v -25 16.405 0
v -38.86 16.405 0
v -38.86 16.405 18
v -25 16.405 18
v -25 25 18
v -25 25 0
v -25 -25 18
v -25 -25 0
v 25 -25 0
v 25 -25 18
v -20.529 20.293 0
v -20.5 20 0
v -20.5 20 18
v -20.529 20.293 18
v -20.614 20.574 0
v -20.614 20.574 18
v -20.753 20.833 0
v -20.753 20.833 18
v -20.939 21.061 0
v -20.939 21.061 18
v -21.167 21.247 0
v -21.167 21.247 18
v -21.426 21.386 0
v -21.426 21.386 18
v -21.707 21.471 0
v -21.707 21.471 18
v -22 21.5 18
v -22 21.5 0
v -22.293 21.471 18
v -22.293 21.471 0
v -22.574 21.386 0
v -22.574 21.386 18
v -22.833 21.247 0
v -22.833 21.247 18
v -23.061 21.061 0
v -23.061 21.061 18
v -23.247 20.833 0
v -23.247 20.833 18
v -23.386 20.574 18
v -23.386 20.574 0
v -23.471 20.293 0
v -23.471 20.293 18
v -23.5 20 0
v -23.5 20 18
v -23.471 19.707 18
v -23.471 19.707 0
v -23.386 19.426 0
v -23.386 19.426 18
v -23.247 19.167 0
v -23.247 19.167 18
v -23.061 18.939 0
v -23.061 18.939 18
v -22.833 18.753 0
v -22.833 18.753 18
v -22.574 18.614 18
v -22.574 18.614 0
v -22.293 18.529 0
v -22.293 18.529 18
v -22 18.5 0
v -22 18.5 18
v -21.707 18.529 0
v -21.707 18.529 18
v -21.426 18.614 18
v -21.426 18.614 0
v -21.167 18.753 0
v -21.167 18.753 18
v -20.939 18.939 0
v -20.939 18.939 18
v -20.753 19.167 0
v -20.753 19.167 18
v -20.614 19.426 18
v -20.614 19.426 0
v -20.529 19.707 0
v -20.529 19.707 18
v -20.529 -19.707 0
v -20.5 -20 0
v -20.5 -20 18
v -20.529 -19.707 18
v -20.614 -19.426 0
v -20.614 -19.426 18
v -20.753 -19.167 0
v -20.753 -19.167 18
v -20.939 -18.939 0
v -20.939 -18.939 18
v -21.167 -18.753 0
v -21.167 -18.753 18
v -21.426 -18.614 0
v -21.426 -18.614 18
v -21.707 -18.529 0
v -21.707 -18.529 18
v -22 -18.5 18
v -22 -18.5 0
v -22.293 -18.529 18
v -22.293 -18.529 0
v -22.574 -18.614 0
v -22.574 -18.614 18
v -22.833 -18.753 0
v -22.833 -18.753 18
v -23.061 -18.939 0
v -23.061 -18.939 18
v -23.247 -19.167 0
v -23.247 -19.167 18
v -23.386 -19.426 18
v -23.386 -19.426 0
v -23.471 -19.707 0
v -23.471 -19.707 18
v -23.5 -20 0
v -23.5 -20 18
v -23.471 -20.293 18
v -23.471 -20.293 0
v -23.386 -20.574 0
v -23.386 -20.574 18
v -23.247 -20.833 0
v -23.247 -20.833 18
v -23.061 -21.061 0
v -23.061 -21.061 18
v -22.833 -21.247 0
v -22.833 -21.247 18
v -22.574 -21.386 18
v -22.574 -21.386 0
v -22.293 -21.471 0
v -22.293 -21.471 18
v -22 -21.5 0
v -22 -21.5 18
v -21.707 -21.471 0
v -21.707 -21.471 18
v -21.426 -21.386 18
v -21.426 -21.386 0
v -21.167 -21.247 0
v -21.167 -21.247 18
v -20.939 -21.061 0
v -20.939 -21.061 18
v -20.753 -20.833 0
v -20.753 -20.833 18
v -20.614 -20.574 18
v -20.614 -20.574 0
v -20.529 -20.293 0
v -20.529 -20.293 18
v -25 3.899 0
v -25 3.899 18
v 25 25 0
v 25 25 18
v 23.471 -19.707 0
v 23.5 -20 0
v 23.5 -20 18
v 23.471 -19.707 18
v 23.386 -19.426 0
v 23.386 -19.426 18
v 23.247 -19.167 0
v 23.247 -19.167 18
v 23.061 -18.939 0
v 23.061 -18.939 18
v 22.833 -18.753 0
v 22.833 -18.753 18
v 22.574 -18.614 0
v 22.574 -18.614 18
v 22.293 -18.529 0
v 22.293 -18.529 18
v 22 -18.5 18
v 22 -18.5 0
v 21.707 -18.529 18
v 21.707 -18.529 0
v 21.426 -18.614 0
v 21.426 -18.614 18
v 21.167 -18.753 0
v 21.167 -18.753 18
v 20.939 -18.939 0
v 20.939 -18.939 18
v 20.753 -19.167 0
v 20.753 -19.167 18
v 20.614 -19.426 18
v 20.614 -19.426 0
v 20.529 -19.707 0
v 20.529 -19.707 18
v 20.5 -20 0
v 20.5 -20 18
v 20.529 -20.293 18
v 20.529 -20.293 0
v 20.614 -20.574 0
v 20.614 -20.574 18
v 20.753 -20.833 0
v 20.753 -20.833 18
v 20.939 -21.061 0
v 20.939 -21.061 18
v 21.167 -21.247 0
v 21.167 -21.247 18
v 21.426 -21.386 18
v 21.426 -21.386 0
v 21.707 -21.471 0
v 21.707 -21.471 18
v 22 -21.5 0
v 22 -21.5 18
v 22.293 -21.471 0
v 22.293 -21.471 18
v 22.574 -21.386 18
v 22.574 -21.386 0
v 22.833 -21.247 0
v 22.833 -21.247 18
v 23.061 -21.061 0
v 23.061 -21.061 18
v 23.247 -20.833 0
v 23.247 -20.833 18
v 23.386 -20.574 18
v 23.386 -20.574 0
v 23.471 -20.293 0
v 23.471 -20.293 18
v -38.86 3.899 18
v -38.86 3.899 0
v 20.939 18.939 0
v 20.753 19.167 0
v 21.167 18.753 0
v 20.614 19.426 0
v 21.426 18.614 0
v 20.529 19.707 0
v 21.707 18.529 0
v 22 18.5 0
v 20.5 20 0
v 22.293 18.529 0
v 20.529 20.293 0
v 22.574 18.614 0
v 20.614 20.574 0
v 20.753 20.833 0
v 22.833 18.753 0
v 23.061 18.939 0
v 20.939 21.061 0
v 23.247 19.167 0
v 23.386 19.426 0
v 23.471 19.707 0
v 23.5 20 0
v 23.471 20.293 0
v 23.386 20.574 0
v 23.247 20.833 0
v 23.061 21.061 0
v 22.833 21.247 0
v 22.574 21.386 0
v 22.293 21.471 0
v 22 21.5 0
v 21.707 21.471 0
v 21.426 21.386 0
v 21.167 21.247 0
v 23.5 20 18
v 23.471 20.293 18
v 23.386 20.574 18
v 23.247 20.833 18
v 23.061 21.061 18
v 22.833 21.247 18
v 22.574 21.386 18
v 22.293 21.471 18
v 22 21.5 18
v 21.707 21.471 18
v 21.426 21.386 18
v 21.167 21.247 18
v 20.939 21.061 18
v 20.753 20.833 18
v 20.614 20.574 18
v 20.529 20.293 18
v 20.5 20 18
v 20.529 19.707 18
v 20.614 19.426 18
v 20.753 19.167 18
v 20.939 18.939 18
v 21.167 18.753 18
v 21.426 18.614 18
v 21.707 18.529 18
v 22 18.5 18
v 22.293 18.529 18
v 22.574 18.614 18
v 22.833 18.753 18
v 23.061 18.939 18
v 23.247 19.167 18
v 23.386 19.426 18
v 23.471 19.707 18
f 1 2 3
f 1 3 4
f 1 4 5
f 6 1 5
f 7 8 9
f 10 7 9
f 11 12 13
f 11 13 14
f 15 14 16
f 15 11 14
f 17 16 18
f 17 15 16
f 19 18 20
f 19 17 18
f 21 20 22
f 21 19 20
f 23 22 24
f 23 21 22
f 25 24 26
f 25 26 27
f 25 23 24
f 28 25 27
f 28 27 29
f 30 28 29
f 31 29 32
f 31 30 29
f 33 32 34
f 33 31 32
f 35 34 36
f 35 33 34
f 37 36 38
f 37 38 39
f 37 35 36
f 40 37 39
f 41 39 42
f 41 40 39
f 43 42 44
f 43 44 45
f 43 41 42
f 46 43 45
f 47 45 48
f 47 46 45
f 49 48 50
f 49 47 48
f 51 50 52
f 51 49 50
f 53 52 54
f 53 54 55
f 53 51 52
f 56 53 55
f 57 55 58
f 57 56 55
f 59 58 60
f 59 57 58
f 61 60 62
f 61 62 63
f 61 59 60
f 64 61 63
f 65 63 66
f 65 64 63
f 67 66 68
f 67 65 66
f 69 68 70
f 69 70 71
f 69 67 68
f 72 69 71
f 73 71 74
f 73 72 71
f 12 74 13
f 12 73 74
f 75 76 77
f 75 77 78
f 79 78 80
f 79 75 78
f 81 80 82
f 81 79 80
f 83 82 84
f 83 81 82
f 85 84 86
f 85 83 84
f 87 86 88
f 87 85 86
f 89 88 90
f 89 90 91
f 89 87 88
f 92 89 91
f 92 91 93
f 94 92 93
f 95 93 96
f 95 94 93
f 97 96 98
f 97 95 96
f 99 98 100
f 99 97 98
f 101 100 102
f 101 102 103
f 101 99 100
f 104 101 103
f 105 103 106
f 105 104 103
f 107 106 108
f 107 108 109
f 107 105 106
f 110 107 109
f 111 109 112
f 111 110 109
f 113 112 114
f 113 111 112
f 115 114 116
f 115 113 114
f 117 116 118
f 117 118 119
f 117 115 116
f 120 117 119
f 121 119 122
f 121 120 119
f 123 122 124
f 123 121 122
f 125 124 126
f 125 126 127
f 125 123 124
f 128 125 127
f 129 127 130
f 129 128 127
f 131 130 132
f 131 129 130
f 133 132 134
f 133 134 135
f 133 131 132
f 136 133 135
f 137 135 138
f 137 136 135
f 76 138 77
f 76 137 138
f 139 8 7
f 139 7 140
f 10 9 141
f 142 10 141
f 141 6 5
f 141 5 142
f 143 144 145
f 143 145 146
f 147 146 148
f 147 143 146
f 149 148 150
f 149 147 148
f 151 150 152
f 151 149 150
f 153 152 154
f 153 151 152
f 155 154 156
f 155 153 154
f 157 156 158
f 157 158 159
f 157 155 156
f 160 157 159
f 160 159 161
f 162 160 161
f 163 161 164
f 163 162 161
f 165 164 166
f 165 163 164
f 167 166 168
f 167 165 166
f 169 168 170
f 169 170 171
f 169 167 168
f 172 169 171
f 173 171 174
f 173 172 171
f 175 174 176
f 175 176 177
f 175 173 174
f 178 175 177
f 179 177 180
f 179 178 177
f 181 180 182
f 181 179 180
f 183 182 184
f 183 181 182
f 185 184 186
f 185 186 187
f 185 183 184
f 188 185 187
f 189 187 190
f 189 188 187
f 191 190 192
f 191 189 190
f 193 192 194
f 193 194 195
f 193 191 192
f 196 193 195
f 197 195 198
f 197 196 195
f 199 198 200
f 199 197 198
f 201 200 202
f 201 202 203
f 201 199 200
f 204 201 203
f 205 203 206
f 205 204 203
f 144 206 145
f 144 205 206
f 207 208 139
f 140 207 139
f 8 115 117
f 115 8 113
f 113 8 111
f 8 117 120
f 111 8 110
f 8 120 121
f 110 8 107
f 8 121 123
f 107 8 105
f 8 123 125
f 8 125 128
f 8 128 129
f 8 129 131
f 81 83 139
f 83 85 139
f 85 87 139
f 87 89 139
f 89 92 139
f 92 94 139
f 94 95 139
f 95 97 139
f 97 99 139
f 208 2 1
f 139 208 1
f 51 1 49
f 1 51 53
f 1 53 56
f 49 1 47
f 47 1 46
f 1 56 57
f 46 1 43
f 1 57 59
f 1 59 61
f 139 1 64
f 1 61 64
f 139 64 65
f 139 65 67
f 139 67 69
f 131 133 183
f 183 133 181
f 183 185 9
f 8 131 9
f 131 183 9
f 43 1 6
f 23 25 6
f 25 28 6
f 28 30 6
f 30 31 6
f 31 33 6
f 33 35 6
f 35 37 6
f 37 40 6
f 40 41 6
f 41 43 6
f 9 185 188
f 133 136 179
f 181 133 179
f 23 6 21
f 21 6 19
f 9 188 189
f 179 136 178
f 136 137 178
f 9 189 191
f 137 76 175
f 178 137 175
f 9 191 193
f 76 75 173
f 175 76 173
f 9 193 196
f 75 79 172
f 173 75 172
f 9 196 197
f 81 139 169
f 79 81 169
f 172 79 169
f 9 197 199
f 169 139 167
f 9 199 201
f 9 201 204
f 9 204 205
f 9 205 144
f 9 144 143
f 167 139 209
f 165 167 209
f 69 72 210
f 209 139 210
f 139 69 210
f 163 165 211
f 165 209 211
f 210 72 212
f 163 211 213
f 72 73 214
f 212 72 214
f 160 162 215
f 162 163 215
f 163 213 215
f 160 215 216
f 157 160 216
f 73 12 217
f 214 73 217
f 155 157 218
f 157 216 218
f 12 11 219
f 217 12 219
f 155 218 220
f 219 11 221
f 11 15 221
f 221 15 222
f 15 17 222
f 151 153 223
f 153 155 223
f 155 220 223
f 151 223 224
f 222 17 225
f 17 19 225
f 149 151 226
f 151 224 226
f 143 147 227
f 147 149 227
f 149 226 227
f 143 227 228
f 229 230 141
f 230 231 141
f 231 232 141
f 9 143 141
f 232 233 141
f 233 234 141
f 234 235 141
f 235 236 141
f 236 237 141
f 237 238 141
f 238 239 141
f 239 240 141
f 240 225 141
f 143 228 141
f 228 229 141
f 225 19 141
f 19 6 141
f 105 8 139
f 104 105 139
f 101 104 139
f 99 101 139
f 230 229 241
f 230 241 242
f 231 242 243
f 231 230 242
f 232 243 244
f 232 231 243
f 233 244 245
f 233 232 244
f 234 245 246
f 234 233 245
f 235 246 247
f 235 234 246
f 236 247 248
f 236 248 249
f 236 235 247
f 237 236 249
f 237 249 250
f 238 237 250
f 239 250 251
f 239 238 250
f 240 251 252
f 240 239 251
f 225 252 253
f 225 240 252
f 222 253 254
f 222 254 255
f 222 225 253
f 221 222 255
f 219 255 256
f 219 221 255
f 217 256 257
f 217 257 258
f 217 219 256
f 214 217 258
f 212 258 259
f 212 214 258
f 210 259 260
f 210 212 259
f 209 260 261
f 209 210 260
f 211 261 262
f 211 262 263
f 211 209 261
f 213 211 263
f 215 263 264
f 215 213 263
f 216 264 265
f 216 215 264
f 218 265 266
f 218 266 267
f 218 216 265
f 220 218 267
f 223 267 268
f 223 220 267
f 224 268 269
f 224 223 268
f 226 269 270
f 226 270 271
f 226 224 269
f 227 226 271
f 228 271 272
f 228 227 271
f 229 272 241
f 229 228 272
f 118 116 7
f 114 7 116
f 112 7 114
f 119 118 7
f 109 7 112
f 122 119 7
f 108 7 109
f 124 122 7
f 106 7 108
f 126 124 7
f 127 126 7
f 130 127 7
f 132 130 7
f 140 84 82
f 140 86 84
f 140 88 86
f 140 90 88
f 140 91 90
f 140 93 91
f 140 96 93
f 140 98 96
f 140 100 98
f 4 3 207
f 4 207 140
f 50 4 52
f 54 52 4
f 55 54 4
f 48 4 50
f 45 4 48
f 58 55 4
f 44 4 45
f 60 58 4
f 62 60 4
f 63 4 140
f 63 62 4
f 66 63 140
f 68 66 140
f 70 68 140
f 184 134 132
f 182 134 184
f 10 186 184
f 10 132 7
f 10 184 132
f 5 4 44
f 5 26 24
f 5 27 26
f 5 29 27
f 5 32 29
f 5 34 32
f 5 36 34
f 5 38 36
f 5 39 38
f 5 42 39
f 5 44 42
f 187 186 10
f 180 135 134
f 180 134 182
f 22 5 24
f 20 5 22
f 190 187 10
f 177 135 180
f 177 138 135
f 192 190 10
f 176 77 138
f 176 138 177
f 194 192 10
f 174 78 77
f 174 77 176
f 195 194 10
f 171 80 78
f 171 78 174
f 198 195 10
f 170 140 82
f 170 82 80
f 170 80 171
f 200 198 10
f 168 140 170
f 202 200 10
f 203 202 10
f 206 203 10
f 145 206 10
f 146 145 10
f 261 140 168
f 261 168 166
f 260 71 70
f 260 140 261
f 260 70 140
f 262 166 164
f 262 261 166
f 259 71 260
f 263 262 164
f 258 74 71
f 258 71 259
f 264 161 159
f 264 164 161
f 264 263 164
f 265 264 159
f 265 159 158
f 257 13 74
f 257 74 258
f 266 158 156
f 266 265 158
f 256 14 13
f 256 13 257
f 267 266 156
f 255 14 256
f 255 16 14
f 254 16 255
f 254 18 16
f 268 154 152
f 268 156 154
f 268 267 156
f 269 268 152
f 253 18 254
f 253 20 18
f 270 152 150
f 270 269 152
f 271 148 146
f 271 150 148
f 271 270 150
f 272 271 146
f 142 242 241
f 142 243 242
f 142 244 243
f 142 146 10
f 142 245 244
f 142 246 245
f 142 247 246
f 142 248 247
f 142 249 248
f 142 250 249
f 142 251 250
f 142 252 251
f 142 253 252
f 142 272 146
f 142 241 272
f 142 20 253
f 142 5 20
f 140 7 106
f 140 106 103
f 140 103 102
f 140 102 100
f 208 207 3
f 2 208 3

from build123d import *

# Parameters (mm, degrees)
SKETCH_1_W      = 50
SKETCH_1_H      = 50
SKETCH_1_R      = 1.5
EXTRUDE_1_DEPTH = 18
SKETCH_2_W      = 13.860098184
SKETCH_2_H      = 12.505152703
EXTRUDE_2_DEPTH = 18


with BuildPart() as part:
    # 草图1 → 凸台-拉伸1 (new body)
    with BuildSketch(Plane.XY):
        Rectangle(SKETCH_1_W, SKETCH_1_H)
        with Locations((-22, 20)):
            Circle(SKETCH_1_R, mode=Mode.SUBTRACT)
        with Locations((-22, -20)):
            Circle(SKETCH_1_R, mode=Mode.SUBTRACT)
        with Locations((22, 20)):
            Circle(SKETCH_1_R, mode=Mode.SUBTRACT)
        with Locations((22, -20)):
            Circle(SKETCH_1_R, mode=Mode.SUBTRACT)
    extrude(amount=EXTRUDE_1_DEPTH)

    # 草图2 → 凸台-拉伸2 (add)
    with BuildSketch(Plane.XY.offset(18)):
        with Locations((-31.930049092, 10.152032571)):
            Rectangle(SKETCH_2_W, SKETCH_2_H)
    extrude(amount=-EXTRUDE_2_DEPTH)


solid = part.part
